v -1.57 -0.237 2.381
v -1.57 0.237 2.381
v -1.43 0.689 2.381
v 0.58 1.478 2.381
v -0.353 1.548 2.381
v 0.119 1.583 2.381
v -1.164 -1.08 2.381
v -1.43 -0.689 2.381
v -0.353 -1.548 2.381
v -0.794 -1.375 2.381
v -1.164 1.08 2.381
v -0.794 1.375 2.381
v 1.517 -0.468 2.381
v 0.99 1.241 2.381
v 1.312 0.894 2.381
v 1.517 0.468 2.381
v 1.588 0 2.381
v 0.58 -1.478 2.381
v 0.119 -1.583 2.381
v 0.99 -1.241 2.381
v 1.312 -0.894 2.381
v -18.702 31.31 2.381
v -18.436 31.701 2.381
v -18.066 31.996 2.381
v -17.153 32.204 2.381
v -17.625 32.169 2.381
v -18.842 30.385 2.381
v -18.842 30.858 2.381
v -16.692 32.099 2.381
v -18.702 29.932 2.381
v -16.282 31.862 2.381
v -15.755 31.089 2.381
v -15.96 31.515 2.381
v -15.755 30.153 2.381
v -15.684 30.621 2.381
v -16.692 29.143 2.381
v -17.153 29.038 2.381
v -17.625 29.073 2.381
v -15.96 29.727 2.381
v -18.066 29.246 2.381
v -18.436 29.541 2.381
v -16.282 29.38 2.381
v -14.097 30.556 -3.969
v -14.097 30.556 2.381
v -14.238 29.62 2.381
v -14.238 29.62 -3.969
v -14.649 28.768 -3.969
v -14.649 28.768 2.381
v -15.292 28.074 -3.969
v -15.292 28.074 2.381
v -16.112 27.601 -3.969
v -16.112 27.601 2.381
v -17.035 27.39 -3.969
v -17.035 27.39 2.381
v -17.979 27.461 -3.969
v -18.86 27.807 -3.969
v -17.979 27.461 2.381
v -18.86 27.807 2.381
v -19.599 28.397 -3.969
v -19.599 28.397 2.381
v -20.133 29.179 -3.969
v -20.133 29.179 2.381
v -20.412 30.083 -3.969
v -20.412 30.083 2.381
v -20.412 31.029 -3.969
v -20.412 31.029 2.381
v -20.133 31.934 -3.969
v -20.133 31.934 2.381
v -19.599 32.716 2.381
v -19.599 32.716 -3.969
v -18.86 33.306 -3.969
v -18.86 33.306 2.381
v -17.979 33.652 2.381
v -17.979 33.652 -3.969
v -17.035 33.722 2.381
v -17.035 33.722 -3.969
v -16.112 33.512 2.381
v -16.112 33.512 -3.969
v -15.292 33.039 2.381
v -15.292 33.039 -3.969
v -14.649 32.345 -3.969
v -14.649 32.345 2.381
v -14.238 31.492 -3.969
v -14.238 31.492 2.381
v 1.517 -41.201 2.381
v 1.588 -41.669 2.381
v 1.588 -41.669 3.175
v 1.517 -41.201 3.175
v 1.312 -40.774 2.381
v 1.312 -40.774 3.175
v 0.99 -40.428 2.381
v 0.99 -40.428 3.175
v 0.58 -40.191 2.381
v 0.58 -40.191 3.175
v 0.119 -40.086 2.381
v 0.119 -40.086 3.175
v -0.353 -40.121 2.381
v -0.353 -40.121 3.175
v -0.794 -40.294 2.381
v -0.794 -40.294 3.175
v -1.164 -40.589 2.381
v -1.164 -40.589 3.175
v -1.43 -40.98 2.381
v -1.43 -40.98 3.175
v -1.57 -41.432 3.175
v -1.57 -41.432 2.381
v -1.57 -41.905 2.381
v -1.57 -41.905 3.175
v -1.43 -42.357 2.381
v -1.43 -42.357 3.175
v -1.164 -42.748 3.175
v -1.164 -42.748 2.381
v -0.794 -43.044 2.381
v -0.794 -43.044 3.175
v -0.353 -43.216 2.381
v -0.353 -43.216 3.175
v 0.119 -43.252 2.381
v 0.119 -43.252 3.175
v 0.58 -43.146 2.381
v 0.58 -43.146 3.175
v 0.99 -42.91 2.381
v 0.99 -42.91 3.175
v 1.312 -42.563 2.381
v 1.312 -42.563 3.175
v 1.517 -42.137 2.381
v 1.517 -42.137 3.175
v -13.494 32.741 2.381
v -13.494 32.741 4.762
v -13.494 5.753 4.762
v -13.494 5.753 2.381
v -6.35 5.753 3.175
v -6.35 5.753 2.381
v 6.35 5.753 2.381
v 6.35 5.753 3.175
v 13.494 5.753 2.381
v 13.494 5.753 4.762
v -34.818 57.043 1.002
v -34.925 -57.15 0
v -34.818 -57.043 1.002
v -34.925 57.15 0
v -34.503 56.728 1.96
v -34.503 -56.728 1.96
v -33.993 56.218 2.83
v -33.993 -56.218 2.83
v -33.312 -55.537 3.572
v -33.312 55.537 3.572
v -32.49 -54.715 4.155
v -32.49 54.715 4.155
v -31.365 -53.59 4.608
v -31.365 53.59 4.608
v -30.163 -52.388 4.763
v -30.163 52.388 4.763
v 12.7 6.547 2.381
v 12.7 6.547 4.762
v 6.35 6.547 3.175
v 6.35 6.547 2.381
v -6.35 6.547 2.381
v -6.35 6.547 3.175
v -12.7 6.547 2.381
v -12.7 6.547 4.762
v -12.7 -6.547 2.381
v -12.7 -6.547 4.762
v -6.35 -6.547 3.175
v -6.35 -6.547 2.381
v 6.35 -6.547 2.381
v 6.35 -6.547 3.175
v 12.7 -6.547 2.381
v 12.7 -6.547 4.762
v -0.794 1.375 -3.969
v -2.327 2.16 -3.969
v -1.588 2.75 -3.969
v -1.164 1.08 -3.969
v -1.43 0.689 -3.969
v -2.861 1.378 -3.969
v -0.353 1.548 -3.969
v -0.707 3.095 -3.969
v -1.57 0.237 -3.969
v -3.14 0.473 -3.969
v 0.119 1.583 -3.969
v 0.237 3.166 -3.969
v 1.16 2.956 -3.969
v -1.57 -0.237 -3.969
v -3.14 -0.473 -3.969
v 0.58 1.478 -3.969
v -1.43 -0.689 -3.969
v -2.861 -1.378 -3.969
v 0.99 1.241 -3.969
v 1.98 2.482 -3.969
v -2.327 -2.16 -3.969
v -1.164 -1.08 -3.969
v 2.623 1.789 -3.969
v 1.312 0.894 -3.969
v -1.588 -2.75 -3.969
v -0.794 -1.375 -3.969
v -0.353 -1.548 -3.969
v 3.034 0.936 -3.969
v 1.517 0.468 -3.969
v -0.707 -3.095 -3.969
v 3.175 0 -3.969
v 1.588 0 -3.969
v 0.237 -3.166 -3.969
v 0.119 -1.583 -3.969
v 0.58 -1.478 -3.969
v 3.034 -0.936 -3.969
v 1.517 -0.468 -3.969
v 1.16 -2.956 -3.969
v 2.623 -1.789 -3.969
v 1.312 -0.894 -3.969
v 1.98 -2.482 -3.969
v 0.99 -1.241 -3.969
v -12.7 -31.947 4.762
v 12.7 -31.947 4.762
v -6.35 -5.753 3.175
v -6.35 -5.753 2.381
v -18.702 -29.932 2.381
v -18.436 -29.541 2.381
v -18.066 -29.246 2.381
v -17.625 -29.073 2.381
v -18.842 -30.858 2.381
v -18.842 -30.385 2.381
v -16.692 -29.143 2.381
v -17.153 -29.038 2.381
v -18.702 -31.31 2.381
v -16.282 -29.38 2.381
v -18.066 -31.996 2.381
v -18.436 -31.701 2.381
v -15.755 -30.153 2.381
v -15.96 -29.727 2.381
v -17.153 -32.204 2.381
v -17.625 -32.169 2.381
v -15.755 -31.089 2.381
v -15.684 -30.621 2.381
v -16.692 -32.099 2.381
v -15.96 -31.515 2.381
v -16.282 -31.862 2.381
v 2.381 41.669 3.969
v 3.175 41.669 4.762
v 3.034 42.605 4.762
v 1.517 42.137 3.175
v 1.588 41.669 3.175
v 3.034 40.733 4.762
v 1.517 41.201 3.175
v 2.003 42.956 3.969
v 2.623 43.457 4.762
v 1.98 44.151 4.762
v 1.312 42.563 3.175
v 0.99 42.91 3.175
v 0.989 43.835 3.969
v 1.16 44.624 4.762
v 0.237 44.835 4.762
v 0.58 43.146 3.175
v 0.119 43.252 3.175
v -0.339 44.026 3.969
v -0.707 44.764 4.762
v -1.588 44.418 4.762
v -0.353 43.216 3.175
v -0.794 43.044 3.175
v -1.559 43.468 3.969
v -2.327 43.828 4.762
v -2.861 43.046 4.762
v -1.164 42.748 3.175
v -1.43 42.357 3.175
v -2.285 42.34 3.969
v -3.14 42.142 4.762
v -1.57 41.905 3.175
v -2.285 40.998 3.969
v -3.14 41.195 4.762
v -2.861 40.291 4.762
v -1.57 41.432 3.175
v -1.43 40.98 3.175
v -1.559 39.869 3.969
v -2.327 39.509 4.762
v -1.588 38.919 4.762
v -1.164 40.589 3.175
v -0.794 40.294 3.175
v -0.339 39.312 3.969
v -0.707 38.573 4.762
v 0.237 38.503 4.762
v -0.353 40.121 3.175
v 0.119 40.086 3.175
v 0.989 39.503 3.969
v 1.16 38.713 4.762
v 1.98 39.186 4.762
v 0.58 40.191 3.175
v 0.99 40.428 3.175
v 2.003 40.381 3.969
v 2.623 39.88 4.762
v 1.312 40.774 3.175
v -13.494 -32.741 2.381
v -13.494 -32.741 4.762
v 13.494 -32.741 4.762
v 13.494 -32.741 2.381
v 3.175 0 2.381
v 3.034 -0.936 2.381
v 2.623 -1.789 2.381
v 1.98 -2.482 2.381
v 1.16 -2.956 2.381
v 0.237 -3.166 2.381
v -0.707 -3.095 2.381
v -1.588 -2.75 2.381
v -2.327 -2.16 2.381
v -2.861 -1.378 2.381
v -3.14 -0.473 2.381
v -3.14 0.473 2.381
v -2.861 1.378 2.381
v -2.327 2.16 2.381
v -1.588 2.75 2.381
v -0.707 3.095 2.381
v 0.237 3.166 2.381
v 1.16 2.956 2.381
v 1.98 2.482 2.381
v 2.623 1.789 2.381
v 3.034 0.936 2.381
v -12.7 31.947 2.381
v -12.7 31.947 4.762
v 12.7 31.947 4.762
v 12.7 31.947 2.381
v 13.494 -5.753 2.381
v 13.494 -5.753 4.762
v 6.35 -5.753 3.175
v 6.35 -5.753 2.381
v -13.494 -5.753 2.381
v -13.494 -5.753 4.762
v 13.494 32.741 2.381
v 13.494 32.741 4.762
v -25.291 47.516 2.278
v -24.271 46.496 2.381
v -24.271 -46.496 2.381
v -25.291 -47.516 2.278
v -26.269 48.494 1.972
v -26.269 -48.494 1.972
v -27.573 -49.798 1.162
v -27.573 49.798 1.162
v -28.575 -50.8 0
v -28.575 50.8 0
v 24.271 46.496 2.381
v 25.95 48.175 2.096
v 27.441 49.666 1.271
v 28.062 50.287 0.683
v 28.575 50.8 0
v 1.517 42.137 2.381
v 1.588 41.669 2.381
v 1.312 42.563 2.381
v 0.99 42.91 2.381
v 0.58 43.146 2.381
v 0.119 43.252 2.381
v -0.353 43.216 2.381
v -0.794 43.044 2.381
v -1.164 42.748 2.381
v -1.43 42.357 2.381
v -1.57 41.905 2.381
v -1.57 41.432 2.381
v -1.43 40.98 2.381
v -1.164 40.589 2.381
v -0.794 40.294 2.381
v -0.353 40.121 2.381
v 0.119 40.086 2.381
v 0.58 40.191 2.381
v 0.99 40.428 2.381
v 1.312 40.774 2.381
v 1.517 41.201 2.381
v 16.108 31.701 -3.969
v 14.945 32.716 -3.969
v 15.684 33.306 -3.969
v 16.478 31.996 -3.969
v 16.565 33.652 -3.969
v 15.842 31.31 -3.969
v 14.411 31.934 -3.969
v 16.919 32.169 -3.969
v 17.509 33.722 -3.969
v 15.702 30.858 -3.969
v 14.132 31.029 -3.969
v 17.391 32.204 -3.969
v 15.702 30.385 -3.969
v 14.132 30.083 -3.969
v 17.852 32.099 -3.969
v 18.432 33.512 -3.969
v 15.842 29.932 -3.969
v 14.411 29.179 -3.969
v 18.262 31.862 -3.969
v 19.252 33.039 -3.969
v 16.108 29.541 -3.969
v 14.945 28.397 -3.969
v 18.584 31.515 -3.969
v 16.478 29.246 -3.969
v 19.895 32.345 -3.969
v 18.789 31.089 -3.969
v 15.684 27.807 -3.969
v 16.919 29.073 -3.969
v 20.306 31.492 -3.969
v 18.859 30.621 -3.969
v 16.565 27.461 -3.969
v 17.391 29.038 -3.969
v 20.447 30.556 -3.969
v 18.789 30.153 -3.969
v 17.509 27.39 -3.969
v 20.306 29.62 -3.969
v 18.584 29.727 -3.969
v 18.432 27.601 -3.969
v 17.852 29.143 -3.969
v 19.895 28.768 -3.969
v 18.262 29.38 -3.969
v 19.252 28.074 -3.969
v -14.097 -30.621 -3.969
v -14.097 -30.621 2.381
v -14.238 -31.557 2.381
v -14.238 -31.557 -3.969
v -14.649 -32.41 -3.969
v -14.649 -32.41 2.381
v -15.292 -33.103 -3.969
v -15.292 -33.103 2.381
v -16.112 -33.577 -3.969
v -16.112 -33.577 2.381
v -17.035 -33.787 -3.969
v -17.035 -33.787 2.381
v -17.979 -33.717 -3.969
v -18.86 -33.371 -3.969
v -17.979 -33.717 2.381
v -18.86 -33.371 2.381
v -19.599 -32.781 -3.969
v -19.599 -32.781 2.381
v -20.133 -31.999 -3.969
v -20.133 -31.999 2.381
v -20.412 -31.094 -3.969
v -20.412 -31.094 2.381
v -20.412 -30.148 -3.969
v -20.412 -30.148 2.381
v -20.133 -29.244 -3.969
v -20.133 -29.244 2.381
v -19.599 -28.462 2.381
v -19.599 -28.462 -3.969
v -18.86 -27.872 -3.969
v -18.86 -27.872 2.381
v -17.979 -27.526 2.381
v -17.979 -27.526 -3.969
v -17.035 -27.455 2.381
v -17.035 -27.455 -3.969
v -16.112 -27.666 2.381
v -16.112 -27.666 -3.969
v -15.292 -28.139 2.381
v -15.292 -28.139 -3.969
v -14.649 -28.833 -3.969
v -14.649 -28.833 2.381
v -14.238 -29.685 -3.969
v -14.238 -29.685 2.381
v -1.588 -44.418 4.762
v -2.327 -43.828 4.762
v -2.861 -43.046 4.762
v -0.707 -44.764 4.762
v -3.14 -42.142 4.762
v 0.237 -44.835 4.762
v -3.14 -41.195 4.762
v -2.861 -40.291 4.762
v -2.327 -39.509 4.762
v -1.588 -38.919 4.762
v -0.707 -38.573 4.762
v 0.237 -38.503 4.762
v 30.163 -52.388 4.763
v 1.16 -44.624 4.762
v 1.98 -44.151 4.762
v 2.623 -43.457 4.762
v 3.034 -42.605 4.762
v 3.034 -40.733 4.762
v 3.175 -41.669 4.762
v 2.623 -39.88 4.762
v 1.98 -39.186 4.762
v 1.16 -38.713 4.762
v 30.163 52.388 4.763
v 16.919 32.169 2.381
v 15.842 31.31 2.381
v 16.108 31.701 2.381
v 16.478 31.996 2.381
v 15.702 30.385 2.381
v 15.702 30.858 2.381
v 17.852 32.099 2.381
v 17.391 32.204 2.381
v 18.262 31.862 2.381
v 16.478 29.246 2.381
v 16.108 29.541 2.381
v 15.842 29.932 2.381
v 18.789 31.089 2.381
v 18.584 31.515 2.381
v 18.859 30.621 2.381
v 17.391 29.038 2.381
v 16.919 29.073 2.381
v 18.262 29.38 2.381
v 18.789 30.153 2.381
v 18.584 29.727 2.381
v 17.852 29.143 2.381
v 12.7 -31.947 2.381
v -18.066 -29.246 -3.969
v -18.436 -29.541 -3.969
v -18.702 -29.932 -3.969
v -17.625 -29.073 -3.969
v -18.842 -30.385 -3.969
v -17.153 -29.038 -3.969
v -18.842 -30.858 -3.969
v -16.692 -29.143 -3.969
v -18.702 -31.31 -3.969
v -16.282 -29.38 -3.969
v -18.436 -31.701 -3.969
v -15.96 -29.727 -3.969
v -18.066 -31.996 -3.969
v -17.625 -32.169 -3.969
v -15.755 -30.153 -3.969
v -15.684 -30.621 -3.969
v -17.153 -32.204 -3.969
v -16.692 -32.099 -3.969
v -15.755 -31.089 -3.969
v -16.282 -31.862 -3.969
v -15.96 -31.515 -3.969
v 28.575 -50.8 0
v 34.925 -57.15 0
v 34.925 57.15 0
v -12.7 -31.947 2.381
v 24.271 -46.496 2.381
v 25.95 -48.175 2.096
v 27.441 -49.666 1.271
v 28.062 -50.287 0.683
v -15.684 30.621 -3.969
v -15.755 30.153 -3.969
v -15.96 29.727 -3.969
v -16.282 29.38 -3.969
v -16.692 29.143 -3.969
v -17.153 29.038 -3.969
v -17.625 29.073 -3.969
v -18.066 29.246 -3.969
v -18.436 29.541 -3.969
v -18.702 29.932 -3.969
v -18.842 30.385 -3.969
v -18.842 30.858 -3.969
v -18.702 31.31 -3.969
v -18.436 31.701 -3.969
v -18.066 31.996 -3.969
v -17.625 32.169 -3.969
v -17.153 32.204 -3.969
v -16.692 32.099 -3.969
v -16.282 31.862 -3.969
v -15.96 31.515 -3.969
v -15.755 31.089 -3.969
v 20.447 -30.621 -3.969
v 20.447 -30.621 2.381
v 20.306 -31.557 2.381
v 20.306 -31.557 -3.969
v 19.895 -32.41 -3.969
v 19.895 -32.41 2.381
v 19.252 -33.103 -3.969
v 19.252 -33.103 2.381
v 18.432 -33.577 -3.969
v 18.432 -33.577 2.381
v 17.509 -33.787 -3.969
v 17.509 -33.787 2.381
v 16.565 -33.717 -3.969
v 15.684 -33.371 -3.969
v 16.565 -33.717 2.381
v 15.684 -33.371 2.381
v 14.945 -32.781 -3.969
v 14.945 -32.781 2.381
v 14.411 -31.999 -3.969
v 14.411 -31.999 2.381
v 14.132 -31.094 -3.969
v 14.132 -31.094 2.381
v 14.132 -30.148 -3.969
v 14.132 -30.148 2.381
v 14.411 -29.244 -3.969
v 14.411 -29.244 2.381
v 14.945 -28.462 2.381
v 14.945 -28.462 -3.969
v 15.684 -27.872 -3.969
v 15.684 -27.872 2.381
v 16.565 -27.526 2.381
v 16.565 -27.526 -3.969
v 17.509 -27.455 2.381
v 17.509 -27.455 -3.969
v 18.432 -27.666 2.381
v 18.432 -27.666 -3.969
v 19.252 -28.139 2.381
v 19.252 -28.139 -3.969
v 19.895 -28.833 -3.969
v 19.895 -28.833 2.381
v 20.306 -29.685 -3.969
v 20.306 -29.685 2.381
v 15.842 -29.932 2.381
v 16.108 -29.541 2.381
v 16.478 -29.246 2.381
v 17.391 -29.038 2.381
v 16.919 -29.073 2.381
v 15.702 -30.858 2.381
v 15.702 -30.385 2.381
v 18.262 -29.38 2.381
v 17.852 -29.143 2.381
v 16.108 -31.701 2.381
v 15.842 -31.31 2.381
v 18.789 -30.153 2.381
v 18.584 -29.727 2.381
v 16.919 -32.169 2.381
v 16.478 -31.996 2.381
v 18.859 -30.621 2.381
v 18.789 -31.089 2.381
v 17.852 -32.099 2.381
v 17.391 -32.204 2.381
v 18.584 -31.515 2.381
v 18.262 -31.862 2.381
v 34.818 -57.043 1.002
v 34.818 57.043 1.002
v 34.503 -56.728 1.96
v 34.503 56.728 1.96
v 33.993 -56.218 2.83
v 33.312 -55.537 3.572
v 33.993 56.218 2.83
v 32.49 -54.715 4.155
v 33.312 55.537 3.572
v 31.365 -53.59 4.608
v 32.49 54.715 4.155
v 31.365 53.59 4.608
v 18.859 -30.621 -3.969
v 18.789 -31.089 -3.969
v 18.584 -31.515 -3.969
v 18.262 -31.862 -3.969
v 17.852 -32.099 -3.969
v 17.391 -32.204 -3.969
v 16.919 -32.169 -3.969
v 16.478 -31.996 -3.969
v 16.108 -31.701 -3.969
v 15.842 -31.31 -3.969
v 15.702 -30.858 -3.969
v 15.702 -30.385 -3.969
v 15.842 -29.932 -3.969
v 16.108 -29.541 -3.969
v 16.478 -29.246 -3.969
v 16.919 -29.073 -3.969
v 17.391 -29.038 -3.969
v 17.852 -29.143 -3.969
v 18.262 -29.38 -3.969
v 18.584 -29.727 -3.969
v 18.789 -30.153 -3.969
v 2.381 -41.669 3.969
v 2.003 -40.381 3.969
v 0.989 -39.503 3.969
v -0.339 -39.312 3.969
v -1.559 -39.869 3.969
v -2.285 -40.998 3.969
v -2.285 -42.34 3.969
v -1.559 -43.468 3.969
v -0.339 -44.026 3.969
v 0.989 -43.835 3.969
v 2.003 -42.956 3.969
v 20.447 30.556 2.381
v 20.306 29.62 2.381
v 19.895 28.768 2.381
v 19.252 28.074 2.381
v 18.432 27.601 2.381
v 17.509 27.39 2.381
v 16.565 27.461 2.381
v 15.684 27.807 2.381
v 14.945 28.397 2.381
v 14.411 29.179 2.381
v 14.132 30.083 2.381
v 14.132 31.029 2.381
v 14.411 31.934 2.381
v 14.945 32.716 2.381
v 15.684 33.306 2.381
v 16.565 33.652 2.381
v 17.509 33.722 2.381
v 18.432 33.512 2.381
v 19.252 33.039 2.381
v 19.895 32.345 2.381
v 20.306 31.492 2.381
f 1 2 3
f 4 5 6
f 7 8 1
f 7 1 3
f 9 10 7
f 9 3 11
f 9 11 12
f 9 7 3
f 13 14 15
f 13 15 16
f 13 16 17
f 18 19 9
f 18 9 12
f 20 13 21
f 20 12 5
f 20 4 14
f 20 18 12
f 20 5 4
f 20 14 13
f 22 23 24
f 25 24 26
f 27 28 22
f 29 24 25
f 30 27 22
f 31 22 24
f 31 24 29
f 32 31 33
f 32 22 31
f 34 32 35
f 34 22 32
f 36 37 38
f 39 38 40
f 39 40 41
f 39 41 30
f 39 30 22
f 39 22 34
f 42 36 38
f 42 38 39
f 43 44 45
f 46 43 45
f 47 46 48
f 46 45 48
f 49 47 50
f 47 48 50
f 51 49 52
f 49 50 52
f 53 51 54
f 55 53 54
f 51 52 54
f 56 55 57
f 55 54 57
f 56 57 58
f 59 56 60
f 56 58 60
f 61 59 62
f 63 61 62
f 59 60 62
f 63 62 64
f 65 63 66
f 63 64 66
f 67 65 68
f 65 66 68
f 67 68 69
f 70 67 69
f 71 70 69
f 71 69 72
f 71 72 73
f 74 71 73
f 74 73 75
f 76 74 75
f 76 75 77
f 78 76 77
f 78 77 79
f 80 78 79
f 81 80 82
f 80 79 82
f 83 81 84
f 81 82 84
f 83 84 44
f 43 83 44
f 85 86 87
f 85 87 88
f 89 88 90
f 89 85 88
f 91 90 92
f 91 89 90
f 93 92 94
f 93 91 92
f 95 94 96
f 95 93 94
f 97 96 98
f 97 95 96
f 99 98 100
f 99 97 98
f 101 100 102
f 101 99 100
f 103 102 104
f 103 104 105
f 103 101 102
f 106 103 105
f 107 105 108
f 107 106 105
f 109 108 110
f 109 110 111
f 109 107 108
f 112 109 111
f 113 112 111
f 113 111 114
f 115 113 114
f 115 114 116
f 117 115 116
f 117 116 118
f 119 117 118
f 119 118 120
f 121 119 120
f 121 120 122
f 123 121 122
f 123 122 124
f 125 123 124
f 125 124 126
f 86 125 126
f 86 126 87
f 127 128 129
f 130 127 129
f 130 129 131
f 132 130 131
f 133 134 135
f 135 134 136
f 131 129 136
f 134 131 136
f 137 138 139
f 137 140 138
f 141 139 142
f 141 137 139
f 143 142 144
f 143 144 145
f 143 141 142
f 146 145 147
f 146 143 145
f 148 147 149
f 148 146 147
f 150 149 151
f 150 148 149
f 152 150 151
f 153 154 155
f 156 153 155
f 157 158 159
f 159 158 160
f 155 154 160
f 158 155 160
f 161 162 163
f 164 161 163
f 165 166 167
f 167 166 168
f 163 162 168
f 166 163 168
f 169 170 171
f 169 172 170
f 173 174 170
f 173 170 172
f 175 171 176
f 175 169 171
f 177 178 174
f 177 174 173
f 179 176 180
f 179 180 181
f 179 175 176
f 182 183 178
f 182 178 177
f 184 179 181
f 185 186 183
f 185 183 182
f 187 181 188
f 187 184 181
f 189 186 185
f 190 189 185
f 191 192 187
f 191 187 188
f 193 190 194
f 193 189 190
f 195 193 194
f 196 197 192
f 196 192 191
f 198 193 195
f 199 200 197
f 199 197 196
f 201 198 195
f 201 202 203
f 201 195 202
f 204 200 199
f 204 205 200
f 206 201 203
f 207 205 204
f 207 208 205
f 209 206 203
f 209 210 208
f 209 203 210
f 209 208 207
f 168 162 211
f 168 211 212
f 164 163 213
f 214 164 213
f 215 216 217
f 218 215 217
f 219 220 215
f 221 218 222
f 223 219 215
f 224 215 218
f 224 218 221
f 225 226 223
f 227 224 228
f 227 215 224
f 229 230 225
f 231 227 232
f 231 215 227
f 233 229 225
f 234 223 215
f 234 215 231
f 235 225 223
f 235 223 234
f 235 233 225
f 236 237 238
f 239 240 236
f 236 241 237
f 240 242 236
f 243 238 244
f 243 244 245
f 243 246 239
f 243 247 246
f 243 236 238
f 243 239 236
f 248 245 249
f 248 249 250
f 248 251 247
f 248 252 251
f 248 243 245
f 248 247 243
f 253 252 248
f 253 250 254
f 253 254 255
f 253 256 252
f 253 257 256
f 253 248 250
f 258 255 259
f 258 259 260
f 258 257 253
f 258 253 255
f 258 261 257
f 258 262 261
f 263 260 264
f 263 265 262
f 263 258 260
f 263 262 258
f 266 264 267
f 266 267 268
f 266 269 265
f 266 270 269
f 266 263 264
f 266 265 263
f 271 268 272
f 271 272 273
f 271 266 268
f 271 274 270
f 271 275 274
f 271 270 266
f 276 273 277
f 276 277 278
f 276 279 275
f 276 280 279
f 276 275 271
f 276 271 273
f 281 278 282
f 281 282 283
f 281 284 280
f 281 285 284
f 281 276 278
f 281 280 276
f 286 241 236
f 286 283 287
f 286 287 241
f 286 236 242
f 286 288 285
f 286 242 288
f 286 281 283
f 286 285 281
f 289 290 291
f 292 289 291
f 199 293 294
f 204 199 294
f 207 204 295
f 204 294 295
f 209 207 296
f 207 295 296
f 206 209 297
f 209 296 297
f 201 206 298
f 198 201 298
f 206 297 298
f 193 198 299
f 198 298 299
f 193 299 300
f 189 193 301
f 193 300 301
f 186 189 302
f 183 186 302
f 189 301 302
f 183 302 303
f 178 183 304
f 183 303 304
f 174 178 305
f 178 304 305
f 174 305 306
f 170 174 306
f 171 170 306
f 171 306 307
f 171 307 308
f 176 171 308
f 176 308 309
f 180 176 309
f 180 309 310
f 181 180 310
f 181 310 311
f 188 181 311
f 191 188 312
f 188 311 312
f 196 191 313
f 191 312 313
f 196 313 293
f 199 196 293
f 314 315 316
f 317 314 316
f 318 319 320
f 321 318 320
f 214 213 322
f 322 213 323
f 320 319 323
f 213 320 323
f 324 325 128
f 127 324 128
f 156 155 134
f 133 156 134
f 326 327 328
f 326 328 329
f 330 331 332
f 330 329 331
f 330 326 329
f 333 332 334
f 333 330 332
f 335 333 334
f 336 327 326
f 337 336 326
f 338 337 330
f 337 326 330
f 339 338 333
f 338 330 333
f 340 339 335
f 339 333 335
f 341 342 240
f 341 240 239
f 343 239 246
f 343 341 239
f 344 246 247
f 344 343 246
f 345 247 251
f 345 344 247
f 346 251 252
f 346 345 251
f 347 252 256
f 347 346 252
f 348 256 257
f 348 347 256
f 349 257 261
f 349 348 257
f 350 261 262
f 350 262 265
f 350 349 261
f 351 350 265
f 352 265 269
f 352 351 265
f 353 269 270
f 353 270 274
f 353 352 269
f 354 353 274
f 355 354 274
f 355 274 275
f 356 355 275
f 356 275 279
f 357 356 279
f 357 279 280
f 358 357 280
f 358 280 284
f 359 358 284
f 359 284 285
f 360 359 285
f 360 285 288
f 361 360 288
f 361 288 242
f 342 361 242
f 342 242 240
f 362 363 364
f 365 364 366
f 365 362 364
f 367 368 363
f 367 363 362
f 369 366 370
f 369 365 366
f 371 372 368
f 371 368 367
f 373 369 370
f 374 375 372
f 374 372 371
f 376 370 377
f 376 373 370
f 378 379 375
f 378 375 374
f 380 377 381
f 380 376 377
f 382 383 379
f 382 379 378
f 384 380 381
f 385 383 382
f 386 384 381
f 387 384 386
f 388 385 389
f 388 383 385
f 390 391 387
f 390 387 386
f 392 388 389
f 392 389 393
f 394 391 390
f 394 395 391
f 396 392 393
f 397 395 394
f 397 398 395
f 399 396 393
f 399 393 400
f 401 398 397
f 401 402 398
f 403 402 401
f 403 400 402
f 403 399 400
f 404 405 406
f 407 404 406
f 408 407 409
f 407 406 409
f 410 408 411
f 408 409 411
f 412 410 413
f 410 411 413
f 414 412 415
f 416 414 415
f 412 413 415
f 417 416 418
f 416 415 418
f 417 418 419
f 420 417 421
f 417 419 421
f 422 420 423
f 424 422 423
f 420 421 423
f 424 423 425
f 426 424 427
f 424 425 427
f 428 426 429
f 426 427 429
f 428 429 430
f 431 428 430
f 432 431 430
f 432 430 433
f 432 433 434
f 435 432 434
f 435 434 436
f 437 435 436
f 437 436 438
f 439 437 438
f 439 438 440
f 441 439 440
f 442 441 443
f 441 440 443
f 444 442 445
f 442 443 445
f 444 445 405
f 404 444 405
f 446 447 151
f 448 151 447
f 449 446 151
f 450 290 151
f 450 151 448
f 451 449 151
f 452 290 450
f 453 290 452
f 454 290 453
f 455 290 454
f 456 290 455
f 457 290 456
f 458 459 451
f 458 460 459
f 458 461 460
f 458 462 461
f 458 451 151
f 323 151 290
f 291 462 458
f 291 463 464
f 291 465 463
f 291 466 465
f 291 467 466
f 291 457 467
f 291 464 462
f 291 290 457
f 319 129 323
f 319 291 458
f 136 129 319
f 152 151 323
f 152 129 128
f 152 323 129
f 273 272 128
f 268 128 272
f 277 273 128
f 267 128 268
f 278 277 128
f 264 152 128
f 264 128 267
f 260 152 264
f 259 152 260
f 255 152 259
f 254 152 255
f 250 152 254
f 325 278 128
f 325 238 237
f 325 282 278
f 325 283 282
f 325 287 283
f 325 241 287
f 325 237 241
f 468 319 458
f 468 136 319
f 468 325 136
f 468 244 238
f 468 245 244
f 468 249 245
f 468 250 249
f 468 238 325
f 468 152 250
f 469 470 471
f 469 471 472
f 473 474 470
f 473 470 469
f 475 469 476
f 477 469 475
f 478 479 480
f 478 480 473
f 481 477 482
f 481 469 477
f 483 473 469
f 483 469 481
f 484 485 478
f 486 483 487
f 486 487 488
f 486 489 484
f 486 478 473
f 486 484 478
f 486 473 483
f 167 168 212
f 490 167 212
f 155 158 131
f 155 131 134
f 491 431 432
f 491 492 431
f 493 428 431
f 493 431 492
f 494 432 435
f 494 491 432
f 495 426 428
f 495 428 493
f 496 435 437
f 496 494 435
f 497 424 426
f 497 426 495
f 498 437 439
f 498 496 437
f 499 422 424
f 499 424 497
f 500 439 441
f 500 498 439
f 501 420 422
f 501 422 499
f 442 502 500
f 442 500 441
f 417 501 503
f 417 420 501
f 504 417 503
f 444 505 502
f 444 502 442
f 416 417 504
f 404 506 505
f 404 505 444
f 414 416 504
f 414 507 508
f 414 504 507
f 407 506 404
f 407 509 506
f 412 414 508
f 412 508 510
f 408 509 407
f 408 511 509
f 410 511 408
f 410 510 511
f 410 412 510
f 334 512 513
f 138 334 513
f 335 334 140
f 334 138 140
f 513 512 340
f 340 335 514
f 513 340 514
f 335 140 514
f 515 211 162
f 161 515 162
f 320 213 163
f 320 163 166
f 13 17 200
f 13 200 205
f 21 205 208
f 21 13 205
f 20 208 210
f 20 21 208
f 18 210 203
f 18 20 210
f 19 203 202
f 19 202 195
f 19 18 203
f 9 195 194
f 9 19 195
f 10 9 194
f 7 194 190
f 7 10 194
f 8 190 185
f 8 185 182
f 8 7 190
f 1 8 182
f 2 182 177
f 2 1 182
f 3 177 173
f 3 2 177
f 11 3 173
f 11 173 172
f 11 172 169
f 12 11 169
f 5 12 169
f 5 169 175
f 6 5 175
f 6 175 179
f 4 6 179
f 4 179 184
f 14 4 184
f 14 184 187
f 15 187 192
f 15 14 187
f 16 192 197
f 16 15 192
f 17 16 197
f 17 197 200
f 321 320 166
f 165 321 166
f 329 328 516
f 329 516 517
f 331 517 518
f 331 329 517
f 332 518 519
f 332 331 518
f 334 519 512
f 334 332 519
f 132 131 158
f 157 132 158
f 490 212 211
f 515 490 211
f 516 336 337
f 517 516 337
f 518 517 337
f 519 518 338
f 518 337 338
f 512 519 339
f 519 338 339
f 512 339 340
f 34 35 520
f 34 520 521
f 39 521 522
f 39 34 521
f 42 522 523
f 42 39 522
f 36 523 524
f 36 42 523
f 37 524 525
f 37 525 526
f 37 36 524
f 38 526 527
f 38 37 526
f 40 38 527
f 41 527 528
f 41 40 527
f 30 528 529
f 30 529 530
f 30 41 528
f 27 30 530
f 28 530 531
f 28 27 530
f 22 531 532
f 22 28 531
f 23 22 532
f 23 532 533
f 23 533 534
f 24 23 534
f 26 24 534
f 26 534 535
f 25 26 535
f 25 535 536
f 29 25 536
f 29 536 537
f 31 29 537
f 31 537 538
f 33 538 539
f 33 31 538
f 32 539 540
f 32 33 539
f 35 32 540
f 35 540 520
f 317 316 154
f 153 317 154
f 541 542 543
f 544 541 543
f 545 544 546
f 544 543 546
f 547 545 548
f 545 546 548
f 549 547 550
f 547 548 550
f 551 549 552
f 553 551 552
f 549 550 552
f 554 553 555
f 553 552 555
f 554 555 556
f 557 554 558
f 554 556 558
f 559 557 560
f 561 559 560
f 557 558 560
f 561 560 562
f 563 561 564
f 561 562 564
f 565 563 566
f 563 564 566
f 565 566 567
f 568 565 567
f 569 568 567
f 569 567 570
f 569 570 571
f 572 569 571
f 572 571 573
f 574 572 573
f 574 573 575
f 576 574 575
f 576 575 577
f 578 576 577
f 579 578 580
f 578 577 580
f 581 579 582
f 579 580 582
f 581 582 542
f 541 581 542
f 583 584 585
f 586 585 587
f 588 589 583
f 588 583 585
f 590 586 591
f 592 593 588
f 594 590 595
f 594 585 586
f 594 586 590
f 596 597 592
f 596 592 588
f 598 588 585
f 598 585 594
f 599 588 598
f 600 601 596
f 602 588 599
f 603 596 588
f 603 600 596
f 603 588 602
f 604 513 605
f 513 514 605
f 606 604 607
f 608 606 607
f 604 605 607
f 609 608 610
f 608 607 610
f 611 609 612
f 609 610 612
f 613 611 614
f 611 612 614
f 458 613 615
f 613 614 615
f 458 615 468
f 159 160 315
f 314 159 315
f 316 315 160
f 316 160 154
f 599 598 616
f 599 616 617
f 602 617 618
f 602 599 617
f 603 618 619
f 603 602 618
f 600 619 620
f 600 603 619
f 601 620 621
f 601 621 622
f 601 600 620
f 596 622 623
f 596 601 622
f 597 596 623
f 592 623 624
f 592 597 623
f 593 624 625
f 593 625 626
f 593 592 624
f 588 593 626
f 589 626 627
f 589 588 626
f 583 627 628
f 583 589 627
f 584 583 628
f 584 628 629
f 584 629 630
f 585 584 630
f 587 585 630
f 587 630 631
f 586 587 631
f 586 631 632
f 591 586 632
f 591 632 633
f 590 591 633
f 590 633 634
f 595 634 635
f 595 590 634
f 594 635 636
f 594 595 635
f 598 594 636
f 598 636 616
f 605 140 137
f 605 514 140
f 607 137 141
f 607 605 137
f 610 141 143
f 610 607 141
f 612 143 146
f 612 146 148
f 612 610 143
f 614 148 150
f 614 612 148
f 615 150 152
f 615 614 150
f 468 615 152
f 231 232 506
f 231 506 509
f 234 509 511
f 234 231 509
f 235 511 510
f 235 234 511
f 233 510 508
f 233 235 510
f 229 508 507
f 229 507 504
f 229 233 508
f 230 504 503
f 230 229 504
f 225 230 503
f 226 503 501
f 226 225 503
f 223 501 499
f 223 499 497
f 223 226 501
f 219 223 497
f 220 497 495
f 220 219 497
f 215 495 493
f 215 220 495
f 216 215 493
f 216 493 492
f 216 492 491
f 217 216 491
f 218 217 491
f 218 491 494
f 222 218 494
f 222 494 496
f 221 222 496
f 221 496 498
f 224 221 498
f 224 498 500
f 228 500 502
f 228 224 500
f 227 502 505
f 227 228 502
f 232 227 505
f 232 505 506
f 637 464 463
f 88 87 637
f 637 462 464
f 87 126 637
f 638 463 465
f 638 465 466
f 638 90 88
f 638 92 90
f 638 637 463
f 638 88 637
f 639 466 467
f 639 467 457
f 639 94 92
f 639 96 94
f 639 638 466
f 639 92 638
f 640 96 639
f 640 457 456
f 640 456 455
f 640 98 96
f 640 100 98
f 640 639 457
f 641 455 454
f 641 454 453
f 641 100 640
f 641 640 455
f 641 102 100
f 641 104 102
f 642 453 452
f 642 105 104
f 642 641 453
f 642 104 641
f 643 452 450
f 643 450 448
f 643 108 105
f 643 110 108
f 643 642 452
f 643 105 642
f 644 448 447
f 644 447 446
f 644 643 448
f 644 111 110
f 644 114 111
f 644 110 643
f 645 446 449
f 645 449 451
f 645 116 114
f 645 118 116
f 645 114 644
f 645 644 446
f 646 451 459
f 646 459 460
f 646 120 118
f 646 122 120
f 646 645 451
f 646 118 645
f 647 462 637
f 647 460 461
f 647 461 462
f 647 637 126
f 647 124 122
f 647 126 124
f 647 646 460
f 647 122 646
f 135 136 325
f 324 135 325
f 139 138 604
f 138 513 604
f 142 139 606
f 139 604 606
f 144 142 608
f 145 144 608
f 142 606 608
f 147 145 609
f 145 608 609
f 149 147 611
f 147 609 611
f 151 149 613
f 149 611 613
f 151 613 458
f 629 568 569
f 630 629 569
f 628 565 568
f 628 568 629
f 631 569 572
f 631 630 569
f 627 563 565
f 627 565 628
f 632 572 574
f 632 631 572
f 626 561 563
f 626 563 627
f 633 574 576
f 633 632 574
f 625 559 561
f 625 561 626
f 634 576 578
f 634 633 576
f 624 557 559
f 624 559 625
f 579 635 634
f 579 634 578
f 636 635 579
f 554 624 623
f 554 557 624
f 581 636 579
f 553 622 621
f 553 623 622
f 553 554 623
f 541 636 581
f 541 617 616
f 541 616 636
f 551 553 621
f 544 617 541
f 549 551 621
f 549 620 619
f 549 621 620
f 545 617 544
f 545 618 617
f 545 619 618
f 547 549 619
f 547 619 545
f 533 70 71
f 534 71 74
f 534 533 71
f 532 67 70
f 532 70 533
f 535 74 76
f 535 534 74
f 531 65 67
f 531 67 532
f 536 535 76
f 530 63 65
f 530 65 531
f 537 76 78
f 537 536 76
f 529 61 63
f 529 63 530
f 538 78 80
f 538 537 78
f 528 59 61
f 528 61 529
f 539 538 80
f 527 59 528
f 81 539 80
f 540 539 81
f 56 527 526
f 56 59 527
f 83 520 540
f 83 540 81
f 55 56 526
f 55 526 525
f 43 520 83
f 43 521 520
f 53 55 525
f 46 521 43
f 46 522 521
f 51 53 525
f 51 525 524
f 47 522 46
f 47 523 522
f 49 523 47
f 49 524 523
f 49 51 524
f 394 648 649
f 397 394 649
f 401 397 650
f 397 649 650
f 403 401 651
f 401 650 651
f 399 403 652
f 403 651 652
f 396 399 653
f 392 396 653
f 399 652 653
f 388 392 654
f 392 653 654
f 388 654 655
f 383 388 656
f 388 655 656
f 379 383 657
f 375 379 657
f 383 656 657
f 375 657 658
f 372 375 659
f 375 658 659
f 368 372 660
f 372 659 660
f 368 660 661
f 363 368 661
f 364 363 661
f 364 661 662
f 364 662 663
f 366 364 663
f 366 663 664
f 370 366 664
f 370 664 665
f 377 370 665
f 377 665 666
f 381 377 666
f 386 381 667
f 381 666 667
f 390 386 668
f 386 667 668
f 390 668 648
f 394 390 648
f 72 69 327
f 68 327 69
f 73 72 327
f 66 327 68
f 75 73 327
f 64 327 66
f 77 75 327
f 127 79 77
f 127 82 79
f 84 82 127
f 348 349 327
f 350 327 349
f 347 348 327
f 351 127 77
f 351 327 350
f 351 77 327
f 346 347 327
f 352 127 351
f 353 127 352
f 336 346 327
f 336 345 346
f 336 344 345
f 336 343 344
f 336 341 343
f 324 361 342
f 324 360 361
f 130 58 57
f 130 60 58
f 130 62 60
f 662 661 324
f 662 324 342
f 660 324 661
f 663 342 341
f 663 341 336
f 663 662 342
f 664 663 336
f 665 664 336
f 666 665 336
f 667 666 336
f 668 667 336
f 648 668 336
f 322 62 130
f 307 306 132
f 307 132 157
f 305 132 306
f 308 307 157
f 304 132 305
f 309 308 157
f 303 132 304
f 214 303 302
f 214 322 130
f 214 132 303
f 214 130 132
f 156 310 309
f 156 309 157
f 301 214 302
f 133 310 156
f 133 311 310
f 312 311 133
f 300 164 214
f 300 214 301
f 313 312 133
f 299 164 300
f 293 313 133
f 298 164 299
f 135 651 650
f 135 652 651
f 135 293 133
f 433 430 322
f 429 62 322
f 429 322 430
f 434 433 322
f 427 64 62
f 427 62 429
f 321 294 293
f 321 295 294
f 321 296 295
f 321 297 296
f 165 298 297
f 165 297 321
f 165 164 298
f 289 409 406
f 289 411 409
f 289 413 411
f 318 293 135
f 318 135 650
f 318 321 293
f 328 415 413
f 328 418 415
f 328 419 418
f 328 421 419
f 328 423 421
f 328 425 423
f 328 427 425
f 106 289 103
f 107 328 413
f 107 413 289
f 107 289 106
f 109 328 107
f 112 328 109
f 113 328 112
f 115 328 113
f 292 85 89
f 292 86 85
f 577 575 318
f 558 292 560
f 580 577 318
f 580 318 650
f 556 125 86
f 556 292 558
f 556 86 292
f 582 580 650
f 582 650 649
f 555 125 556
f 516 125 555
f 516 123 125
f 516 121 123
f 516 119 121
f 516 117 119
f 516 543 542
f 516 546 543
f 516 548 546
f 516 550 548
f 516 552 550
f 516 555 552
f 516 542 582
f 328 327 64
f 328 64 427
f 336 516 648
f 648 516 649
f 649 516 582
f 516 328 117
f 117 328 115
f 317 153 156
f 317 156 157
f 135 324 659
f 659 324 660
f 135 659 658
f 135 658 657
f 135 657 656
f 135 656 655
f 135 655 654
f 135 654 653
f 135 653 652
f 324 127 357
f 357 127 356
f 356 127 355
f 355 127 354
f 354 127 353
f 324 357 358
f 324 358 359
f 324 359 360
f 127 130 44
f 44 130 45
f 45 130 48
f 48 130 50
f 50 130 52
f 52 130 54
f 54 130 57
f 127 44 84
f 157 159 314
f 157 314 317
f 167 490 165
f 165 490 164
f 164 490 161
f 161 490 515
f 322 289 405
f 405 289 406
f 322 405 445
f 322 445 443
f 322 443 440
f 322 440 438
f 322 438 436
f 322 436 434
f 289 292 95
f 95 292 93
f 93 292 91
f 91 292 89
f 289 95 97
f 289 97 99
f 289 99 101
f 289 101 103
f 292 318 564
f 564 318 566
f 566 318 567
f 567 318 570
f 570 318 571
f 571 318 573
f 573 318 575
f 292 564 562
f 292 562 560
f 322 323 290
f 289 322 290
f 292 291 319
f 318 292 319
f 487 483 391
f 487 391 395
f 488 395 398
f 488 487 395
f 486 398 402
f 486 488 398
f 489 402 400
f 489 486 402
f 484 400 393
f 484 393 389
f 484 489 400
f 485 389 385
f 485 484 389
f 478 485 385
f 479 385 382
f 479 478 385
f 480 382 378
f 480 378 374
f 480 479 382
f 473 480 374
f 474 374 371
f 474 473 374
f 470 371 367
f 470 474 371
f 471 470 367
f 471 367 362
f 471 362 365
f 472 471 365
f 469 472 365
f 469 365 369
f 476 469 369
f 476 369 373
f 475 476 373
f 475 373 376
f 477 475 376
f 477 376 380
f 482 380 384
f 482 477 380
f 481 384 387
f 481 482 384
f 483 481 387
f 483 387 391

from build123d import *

# Parameters (mm, degrees)
F0_W        = 69.85
F0_H        = 114.3
F0_R        = 1.5875
F1_DEPTH    = 4.7625
F2_R        = 4.76249
F3_SIZE     = 1.5875
F4_W        = 57.15
F4_H        = 101.6
F5_DEPTH    = 2.38125
F6_T1_DEPTH = 101.6
F6_T3_DEPTH = 57.15
F8_DEPTH    = 4.7635
F7_W        = 12.7
F7_H        = 0.79375
F9_DEPTH    = 1.5875
F10_R       = 3.175
F10_R_2     = 1.5875
F11_DEPTH   = 6.35


# Not quite as in the source:
# - a fillet or chamfer that OpenCascade refuses, or shapes differently, is made with other operations: its cross-section is extruded or revolved along the edge and cut away or added
# - a fillet or chamfer is up to 0.001 mm smaller than in the source, because OpenCascade refuses the exact size


with BuildPart() as f1:
    # F0 (on Top) → F1 (new body)
    with BuildSketch(Plane.XY):
        Rectangle(F0_W, F0_H)
        with Locations((0, -41.6687)):
            Circle(F0_R, mode=Mode.SUBTRACT)
        with Locations((0, 41.6687)):
            Circle(F0_R, mode=Mode.SUBTRACT)
    extrude(amount=F1_DEPTH)

    # F2 (radius 4.7625 in the source; OpenCascade refuses exactly that, so slightly less here)
    f2_edges = [f1.edges().sort_by_distance(p)[0] for p in [
        (34.925, 0, 4.7625),
        (0, -57.15, 4.7625),
        (-34.925, 0, 4.7625),
        (0, 57.15, 4.7625),
    ]]
    fillet(f2_edges, radius=F2_R)

    # F3
    f3_edges = [f1.edges().sort_by_distance(p)[0] for p in [
        (-1.5875, 41.6687, 4.7625),
        (-1.5875, -41.6687, 4.7625),
    ]]
    chamfer(f3_edges, length=F3_SIZE)

    # F4 (on face) → F5 (cut)
    with BuildSketch(Plane(origin=(0, 0, 0), x_dir=(1, 0, 0), z_dir=(0, 0, -1))):
        Rectangle(F4_W, F4_H)
    extrude(amount=-F5_DEPTH, mode=Mode.SUBTRACT)

    # F6: fillet of radius 5.08 on 4 edges, made by hand

    # F6_s2 → F6_t1 (join)
    with BuildSketch(Plane.XZ.offset(-50.8)):
        with BuildLine():
            ThreePointArc((24.2711472565, 2.38125), (26.7304916814, 1.74625), (28.575, 0))
            Line((28.575, 0), (28.575, 2.38125))
            Line((28.575, 2.38125), (24.2711472565, 2.38125))
        make_face()
        with BuildLine():
            ThreePointArc((-24.2711472565, 2.38125), (-26.7304916814, 1.74625), (-28.575, 0))
            Line((-28.575, 0), (-28.575, 2.38125))
            Line((-28.575, 2.38125), (-24.2711472565, 2.38125))
        make_face()
    extrude(amount=F6_T1_DEPTH)

    # F6_s4 → F6_t3 (join)
    with BuildSketch(Plane.YZ.offset(-28.575)):
        with BuildLine():
            ThreePointArc((-46.4961472565, 2.38125), (-48.9554916814, 1.74625), (-50.8, 0))
            Line((-50.8, 0), (-50.8, 2.38125))
            Line((-50.8, 2.38125), (-46.4961472565, 2.38125))
        make_face()
        with BuildLine():
            ThreePointArc((46.4961472565, 2.38125), (48.9554916814, 1.74625), (50.8, 0))
            Line((50.8, 0), (50.8, 2.38125))
            Line((50.8, 2.38125), (46.4961472565, 2.38125))
        make_face()
    extrude(amount=F6_T3_DEPTH)

    # F7 (on face) → F8 (cut, through all)
    with BuildSketch(Plane.XY.offset(4.7625)):
        Polygon((-12.7, 31.94685), (12.7, 31.94685), (12.7, 6.54685), (6.35, 6.54685), (6.35, 5.7531), (13.49375, 5.7531), (13.49375, 32.7406), (-13.49375, 32.7406), (-13.49375, 5.7531), (-6.35, 5.7531), (-6.35, 6.54685), (-12.7, 6.54685), align=None)
        Polygon((6.35, -5.7531), (6.35, -6.54685), (12.7, -6.54685), (12.7, -31.94685), (-12.7, -31.94685), (-12.7, -6.54685), (-6.35, -6.54685), (-6.35, -5.7531), (-13.49375, -5.7531), (-13.49375, -32.7406), (13.49375, -32.7406), (13.49375, -5.7531), align=None)
    extrude(amount=-F8_DEPTH, mode=Mode.SUBTRACT)

    # F7 (on face) → F9 (cut)
    with BuildSketch(Plane.XY.offset(4.7625)):
        with Locations((0, 6.149975)):
            Rectangle(F7_W, F7_H)
        with Locations((0, -6.149975)):
            Rectangle(F7_W, F7_H)
    extrude(amount=-F9_DEPTH, mode=Mode.SUBTRACT)

    # F10 (on face) → F11 (join)
    with BuildSketch(Plane(origin=(0, 0, 2.38125), x_dir=(1, 0, 0), z_dir=(0, 0, -1))):
        with Locations((-17.272, 30.6211472565)):
            Circle(F10_R)
        with Locations((-17.272, 30.6211472565)):
            Circle(F10_R_2, mode=Mode.SUBTRACT)
        with Locations((-17.272, -30.5562)):
            Circle(F10_R)
        with Locations((-17.272, -30.6211472565)):
            Circle(F10_R_2, mode=Mode.SUBTRACT)
        with Locations((17.272, 30.6211472565)):
            Circle(F10_R)
        with Locations((17.272, 30.6211472565)):
            Circle(F10_R_2, mode=Mode.SUBTRACT)
        with Locations((17.272, -30.5562)):
            Circle(F10_R)
        with Locations((17.272, -30.6211472565)):
            Circle(F10_R_2, mode=Mode.SUBTRACT)
        Circle(F10_R)
        Circle(F10_R_2, mode=Mode.SUBTRACT)
    extrude(amount=F11_DEPTH)


solid = f1.part
